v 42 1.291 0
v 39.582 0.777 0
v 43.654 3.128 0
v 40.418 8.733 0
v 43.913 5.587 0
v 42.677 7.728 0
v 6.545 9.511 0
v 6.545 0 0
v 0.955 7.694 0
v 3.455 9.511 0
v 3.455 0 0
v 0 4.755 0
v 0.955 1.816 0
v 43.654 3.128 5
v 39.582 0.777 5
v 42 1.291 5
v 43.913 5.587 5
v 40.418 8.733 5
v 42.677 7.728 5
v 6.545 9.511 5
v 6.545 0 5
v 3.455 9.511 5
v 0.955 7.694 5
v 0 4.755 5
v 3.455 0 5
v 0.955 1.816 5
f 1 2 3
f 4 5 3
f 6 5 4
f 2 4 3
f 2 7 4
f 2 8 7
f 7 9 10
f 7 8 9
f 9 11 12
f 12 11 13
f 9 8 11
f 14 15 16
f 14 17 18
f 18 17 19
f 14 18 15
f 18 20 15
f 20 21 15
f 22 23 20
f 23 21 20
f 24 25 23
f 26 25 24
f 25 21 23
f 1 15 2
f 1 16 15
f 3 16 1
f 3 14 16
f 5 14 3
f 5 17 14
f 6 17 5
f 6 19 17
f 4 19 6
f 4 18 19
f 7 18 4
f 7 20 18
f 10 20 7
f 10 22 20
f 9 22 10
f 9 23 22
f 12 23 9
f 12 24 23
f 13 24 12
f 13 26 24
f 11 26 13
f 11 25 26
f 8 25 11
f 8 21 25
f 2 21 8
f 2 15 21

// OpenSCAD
$fn = 32;

// ----------------------------------------------------------------------
// Lever arm: two bosses 10 and 8 mm, 35 mm between centres
// ----------------------------------------------------------------------

// --- parameters (mm) ---
profile_height = 5;       // extrusion height
profile_points = 13;      // points of the closed outline

profile = [[0, 4.755], [0.955, 1.816], [3.455, 0], [6.545, 0], [39.582, 0.777], [42, 1.291], [43.654, 3.128], [43.913, 5.587], [42.677, 7.728], [40.418, 8.733], [6.545, 9.511], [3.455, 9.511], [0.955, 7.694]];  // single closed polygon, 13 points, counter clockwise

// --- the one profile operation ---
linear_extrude(height = profile_height) polygon(points = profile);
